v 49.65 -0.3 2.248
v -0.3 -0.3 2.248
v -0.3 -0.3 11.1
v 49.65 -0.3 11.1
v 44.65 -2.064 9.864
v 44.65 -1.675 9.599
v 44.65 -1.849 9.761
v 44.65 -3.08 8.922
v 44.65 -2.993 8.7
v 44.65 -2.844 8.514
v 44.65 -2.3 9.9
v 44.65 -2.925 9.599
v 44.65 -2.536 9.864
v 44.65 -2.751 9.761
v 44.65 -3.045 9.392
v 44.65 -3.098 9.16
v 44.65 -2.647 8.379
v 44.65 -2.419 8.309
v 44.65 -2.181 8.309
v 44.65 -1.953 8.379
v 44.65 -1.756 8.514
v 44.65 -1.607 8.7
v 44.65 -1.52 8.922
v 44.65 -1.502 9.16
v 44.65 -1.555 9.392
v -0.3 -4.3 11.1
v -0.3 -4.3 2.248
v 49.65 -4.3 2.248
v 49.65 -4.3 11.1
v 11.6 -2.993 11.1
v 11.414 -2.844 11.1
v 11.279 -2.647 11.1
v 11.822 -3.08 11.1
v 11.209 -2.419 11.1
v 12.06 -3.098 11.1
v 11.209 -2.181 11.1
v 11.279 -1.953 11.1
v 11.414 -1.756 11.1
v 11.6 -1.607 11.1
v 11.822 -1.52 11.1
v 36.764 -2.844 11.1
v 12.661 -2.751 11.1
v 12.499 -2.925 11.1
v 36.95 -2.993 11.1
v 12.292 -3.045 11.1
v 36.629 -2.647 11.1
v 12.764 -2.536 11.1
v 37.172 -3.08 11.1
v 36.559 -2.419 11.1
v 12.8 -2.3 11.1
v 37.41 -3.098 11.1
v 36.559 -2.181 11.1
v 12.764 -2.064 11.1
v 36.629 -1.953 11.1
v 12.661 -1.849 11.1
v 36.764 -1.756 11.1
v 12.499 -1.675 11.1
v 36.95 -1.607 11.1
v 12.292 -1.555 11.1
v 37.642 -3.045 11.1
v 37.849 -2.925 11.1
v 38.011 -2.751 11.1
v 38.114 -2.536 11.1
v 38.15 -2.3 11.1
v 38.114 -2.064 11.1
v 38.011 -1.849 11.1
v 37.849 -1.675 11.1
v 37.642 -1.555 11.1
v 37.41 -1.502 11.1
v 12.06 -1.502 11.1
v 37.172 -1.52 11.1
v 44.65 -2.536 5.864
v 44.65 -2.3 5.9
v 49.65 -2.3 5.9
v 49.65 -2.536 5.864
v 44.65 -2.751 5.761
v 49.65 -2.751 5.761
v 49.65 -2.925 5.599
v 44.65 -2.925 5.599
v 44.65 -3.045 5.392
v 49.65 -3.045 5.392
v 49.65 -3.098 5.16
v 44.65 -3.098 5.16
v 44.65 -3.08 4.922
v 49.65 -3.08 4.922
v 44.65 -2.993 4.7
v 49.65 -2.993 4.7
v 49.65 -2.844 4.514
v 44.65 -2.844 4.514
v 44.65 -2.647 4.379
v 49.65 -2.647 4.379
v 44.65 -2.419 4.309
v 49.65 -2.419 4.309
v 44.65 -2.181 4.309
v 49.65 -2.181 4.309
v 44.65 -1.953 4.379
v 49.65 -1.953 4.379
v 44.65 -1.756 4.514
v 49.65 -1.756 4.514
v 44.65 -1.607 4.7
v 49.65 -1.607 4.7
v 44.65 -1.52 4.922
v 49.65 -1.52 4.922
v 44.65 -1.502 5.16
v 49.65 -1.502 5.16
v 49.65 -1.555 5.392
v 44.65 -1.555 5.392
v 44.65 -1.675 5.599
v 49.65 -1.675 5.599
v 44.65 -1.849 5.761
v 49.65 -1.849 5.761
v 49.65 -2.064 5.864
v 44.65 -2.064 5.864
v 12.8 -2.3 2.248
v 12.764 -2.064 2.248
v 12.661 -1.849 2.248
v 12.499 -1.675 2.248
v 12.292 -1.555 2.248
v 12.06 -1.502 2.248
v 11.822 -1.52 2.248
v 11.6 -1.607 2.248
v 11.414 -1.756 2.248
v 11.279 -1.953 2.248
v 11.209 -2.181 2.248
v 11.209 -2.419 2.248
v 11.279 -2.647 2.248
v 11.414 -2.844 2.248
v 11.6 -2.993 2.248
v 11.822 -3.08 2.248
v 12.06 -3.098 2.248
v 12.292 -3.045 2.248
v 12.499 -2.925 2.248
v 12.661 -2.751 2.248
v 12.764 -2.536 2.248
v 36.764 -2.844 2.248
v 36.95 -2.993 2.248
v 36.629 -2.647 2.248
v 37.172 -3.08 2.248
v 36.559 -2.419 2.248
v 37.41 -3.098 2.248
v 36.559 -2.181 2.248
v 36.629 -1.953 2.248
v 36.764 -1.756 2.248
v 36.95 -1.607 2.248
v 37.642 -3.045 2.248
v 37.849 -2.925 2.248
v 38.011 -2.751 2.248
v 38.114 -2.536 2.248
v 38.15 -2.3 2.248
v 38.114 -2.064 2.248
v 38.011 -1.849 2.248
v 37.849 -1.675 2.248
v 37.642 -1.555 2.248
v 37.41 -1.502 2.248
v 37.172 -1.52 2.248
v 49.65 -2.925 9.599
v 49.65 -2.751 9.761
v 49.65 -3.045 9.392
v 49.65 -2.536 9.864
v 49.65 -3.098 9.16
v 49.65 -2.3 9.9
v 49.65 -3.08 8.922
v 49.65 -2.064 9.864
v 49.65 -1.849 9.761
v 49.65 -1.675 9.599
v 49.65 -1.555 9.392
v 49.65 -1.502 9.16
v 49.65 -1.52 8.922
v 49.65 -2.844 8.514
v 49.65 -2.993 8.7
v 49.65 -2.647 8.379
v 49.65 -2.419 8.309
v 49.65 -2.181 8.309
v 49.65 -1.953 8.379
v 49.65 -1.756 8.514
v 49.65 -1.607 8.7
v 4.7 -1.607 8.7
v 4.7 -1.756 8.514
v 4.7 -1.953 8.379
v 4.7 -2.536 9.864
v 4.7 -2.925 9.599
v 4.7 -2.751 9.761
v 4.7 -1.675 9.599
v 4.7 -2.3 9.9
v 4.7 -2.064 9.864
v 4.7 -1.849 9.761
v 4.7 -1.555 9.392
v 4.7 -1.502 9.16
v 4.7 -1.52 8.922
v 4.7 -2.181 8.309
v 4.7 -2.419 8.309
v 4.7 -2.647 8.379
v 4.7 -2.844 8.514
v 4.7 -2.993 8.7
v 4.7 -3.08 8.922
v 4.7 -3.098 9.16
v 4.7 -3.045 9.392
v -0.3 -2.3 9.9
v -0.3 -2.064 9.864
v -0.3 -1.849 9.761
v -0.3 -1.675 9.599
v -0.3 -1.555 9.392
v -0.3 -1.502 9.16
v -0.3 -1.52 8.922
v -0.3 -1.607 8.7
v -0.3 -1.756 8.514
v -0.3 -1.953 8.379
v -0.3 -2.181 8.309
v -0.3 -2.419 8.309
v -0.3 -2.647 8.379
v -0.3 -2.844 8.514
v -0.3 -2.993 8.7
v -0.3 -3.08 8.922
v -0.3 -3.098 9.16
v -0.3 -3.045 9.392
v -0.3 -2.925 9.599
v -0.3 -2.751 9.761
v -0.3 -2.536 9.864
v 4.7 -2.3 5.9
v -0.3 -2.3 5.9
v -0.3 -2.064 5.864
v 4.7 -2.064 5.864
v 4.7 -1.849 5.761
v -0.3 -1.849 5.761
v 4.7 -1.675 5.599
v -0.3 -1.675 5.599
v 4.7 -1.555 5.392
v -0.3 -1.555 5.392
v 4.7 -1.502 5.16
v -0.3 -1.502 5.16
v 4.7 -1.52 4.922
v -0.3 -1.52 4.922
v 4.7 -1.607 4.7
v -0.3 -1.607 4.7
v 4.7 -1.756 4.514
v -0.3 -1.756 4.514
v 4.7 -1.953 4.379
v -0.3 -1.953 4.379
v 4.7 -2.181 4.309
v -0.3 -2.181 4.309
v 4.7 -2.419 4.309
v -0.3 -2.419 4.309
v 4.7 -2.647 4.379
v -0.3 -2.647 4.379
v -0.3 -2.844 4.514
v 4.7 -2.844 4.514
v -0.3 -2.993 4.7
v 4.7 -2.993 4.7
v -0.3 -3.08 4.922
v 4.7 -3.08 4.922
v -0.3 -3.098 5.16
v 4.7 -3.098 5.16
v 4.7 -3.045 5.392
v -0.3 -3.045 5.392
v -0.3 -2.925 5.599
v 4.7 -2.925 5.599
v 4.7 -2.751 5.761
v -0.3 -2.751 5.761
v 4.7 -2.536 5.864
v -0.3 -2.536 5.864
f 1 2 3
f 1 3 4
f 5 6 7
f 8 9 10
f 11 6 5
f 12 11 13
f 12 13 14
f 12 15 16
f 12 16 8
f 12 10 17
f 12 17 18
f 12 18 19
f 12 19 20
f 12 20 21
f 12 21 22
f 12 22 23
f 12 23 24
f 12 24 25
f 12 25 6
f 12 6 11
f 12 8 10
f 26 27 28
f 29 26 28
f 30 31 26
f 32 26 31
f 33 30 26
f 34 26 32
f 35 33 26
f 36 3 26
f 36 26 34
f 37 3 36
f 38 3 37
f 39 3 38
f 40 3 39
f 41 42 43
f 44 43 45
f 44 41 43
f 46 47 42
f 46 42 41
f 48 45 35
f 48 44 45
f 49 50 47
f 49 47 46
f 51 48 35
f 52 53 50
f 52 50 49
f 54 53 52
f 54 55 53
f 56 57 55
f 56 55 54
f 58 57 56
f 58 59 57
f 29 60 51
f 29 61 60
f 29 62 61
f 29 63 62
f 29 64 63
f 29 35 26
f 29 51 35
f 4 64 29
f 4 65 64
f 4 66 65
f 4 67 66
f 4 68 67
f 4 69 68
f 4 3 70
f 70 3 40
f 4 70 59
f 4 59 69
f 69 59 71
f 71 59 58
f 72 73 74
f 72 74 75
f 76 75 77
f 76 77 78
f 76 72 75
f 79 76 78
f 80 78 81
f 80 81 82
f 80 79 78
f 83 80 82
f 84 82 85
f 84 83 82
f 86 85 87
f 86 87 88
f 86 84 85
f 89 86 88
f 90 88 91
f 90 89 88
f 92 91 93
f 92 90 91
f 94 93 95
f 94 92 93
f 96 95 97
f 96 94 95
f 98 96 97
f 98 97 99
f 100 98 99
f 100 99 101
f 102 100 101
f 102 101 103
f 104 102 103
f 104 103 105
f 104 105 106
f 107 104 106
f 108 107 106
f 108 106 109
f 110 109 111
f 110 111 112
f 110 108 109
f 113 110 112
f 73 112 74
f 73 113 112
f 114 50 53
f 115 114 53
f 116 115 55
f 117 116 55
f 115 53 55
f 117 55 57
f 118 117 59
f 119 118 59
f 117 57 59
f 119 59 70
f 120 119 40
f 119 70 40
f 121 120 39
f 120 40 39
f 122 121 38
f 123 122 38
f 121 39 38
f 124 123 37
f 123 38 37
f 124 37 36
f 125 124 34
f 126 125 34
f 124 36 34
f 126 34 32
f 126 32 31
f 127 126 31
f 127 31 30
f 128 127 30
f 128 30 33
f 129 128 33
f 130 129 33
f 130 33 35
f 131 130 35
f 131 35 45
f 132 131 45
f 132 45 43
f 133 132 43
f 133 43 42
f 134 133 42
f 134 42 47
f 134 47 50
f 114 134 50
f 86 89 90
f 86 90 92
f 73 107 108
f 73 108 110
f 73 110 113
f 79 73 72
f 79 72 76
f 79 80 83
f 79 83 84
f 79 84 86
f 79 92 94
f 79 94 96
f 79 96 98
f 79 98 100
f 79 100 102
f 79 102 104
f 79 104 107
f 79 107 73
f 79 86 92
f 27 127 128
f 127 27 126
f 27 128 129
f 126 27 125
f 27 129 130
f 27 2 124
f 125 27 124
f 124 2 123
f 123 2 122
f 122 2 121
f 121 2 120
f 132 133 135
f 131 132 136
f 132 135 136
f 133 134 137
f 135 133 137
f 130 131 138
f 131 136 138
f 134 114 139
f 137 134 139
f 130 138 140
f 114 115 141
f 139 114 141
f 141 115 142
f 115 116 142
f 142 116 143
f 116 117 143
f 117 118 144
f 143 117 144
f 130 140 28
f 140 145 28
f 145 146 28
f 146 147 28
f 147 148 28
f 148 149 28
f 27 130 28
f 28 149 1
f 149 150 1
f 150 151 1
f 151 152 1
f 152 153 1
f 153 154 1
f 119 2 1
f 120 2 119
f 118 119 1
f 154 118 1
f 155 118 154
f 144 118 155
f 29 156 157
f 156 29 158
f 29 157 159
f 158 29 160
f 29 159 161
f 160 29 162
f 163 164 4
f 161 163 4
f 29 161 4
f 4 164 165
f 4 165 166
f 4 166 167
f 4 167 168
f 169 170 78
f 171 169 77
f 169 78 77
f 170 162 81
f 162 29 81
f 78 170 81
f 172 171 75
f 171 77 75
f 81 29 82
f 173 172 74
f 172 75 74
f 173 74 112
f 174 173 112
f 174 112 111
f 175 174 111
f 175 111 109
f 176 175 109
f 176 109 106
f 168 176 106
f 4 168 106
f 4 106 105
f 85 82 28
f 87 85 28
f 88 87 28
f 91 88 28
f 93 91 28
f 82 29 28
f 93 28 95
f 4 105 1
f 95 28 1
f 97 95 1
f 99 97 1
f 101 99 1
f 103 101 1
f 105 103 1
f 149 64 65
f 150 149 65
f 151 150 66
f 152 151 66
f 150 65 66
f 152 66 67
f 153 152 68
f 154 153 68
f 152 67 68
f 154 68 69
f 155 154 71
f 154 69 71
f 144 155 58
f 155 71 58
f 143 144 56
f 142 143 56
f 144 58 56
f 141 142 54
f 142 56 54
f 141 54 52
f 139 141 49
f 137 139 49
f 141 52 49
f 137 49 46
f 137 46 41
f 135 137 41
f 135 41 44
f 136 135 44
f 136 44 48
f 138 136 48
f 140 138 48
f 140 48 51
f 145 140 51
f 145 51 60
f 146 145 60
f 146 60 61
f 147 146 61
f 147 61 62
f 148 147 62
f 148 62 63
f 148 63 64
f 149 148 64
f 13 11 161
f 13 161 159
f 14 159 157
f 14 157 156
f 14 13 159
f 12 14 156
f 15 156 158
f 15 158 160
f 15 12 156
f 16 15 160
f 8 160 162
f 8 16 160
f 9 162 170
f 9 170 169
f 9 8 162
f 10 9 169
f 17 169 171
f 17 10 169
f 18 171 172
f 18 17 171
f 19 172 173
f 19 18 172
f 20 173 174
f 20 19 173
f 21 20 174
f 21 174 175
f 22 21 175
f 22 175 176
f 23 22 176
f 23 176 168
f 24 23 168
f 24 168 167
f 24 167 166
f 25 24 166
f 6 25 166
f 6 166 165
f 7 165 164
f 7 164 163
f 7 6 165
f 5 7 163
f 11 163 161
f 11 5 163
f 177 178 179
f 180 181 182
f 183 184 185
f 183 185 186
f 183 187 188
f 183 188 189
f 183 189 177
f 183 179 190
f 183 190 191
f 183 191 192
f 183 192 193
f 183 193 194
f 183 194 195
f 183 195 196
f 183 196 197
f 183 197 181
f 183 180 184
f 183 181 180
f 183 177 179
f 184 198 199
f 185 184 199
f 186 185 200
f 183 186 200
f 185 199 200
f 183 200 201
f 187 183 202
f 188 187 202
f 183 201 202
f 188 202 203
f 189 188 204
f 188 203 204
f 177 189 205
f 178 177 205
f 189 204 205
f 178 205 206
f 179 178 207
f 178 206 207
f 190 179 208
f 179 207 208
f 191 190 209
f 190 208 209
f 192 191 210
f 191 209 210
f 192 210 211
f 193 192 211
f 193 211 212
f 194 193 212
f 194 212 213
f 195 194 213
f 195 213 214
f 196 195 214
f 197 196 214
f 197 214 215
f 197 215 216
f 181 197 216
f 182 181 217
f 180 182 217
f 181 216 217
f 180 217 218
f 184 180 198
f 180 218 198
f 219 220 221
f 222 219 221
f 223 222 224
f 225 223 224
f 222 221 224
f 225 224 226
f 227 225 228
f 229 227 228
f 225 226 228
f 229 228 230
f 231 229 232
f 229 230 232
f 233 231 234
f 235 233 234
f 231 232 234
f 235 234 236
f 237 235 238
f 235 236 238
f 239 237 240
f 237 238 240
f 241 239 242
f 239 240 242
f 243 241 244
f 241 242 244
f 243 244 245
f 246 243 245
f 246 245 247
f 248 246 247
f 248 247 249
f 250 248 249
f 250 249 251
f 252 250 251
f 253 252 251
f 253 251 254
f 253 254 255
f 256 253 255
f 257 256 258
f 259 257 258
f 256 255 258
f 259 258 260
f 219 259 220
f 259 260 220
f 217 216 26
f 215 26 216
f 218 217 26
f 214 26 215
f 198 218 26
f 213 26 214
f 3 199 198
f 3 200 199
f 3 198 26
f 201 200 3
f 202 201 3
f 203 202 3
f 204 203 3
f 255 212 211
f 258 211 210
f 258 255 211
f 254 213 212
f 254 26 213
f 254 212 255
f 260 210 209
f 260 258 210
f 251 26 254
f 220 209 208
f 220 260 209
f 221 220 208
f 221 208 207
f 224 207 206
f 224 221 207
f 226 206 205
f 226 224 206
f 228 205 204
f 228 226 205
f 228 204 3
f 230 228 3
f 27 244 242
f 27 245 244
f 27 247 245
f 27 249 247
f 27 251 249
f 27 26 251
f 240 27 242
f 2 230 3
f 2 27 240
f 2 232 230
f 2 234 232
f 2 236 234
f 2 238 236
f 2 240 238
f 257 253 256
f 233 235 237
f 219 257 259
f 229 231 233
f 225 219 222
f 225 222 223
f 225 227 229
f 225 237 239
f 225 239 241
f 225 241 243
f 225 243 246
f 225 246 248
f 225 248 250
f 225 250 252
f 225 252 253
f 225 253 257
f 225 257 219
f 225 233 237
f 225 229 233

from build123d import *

# Parameters (mm, degrees)
MAIN_STOCK_START             = 2.248090434
SKETCH_1_W                   = 49.95
SKETCH_1_H                   = 4
MAIN_STOCK_DEPTH             = 8.851909566
SKETCH_2_R                   = 0.8
FRAME_2XD1P6_THROUGH_DEPTH   = 51.615894766
SKETCH_3_R                   = 0.8
CORNER_L_2XD1P6_BLIND5_DEPTH = 5
CORNER_R_2XD1P6_BLIND5_START = -5
SKETCH_4_R                   = 0.8
CORNER_R_2XD1P6_BLIND5_DEPTH = 5


with BuildPart() as part:
    # 草图1 → Main_Stock (new body)
    with BuildSketch(Plane.XY.offset(MAIN_STOCK_START)):
        with Locations((24.675, -2.3)):
            Rectangle(SKETCH_1_W, SKETCH_1_H)
    extrude(amount=MAIN_STOCK_DEPTH)

    # 草图2 → Frame_2xD1p6_Through (cut, through all)
    with BuildSketch(Plane.XY.offset(11.1)):
        with Locations((12, -2.3)):
            Circle(SKETCH_2_R)
        with Locations((37.35, -2.3)):
            Circle(SKETCH_2_R)
    extrude(amount=-FRAME_2XD1P6_THROUGH_DEPTH, mode=Mode.SUBTRACT)

    # 草图3 → Corner_L_2xD1p6_Blind5 (cut)
    with BuildSketch(Plane.ZY.offset(0.3)):
        with Locations((5.1, -2.3)):
            Circle(SKETCH_3_R)
        with Locations((9.1, -2.3)):
            Circle(SKETCH_3_R)
    extrude(amount=-CORNER_L_2XD1P6_BLIND5_DEPTH, mode=Mode.SUBTRACT)

    # 草图4 → Corner_R_2xD1p6_Blind5 (cut)
    with BuildSketch(Plane(origin=(49.65, 0, 0), x_dir=(0, 0, -1), z_dir=(1, 0, 0)).offset(CORNER_R_2XD1P6_BLIND5_START)):
        with Locations(Location((-5.1, -2.3, 0), (0, 0, 180))):
            Circle(SKETCH_4_R)
        with Locations(Location((-9.1, -2.3, 0), (0, 0, 180))):
            Circle(SKETCH_4_R)
    extrude(amount=CORNER_R_2XD1P6_BLIND5_DEPTH, mode=Mode.SUBTRACT)


solid = part.part
